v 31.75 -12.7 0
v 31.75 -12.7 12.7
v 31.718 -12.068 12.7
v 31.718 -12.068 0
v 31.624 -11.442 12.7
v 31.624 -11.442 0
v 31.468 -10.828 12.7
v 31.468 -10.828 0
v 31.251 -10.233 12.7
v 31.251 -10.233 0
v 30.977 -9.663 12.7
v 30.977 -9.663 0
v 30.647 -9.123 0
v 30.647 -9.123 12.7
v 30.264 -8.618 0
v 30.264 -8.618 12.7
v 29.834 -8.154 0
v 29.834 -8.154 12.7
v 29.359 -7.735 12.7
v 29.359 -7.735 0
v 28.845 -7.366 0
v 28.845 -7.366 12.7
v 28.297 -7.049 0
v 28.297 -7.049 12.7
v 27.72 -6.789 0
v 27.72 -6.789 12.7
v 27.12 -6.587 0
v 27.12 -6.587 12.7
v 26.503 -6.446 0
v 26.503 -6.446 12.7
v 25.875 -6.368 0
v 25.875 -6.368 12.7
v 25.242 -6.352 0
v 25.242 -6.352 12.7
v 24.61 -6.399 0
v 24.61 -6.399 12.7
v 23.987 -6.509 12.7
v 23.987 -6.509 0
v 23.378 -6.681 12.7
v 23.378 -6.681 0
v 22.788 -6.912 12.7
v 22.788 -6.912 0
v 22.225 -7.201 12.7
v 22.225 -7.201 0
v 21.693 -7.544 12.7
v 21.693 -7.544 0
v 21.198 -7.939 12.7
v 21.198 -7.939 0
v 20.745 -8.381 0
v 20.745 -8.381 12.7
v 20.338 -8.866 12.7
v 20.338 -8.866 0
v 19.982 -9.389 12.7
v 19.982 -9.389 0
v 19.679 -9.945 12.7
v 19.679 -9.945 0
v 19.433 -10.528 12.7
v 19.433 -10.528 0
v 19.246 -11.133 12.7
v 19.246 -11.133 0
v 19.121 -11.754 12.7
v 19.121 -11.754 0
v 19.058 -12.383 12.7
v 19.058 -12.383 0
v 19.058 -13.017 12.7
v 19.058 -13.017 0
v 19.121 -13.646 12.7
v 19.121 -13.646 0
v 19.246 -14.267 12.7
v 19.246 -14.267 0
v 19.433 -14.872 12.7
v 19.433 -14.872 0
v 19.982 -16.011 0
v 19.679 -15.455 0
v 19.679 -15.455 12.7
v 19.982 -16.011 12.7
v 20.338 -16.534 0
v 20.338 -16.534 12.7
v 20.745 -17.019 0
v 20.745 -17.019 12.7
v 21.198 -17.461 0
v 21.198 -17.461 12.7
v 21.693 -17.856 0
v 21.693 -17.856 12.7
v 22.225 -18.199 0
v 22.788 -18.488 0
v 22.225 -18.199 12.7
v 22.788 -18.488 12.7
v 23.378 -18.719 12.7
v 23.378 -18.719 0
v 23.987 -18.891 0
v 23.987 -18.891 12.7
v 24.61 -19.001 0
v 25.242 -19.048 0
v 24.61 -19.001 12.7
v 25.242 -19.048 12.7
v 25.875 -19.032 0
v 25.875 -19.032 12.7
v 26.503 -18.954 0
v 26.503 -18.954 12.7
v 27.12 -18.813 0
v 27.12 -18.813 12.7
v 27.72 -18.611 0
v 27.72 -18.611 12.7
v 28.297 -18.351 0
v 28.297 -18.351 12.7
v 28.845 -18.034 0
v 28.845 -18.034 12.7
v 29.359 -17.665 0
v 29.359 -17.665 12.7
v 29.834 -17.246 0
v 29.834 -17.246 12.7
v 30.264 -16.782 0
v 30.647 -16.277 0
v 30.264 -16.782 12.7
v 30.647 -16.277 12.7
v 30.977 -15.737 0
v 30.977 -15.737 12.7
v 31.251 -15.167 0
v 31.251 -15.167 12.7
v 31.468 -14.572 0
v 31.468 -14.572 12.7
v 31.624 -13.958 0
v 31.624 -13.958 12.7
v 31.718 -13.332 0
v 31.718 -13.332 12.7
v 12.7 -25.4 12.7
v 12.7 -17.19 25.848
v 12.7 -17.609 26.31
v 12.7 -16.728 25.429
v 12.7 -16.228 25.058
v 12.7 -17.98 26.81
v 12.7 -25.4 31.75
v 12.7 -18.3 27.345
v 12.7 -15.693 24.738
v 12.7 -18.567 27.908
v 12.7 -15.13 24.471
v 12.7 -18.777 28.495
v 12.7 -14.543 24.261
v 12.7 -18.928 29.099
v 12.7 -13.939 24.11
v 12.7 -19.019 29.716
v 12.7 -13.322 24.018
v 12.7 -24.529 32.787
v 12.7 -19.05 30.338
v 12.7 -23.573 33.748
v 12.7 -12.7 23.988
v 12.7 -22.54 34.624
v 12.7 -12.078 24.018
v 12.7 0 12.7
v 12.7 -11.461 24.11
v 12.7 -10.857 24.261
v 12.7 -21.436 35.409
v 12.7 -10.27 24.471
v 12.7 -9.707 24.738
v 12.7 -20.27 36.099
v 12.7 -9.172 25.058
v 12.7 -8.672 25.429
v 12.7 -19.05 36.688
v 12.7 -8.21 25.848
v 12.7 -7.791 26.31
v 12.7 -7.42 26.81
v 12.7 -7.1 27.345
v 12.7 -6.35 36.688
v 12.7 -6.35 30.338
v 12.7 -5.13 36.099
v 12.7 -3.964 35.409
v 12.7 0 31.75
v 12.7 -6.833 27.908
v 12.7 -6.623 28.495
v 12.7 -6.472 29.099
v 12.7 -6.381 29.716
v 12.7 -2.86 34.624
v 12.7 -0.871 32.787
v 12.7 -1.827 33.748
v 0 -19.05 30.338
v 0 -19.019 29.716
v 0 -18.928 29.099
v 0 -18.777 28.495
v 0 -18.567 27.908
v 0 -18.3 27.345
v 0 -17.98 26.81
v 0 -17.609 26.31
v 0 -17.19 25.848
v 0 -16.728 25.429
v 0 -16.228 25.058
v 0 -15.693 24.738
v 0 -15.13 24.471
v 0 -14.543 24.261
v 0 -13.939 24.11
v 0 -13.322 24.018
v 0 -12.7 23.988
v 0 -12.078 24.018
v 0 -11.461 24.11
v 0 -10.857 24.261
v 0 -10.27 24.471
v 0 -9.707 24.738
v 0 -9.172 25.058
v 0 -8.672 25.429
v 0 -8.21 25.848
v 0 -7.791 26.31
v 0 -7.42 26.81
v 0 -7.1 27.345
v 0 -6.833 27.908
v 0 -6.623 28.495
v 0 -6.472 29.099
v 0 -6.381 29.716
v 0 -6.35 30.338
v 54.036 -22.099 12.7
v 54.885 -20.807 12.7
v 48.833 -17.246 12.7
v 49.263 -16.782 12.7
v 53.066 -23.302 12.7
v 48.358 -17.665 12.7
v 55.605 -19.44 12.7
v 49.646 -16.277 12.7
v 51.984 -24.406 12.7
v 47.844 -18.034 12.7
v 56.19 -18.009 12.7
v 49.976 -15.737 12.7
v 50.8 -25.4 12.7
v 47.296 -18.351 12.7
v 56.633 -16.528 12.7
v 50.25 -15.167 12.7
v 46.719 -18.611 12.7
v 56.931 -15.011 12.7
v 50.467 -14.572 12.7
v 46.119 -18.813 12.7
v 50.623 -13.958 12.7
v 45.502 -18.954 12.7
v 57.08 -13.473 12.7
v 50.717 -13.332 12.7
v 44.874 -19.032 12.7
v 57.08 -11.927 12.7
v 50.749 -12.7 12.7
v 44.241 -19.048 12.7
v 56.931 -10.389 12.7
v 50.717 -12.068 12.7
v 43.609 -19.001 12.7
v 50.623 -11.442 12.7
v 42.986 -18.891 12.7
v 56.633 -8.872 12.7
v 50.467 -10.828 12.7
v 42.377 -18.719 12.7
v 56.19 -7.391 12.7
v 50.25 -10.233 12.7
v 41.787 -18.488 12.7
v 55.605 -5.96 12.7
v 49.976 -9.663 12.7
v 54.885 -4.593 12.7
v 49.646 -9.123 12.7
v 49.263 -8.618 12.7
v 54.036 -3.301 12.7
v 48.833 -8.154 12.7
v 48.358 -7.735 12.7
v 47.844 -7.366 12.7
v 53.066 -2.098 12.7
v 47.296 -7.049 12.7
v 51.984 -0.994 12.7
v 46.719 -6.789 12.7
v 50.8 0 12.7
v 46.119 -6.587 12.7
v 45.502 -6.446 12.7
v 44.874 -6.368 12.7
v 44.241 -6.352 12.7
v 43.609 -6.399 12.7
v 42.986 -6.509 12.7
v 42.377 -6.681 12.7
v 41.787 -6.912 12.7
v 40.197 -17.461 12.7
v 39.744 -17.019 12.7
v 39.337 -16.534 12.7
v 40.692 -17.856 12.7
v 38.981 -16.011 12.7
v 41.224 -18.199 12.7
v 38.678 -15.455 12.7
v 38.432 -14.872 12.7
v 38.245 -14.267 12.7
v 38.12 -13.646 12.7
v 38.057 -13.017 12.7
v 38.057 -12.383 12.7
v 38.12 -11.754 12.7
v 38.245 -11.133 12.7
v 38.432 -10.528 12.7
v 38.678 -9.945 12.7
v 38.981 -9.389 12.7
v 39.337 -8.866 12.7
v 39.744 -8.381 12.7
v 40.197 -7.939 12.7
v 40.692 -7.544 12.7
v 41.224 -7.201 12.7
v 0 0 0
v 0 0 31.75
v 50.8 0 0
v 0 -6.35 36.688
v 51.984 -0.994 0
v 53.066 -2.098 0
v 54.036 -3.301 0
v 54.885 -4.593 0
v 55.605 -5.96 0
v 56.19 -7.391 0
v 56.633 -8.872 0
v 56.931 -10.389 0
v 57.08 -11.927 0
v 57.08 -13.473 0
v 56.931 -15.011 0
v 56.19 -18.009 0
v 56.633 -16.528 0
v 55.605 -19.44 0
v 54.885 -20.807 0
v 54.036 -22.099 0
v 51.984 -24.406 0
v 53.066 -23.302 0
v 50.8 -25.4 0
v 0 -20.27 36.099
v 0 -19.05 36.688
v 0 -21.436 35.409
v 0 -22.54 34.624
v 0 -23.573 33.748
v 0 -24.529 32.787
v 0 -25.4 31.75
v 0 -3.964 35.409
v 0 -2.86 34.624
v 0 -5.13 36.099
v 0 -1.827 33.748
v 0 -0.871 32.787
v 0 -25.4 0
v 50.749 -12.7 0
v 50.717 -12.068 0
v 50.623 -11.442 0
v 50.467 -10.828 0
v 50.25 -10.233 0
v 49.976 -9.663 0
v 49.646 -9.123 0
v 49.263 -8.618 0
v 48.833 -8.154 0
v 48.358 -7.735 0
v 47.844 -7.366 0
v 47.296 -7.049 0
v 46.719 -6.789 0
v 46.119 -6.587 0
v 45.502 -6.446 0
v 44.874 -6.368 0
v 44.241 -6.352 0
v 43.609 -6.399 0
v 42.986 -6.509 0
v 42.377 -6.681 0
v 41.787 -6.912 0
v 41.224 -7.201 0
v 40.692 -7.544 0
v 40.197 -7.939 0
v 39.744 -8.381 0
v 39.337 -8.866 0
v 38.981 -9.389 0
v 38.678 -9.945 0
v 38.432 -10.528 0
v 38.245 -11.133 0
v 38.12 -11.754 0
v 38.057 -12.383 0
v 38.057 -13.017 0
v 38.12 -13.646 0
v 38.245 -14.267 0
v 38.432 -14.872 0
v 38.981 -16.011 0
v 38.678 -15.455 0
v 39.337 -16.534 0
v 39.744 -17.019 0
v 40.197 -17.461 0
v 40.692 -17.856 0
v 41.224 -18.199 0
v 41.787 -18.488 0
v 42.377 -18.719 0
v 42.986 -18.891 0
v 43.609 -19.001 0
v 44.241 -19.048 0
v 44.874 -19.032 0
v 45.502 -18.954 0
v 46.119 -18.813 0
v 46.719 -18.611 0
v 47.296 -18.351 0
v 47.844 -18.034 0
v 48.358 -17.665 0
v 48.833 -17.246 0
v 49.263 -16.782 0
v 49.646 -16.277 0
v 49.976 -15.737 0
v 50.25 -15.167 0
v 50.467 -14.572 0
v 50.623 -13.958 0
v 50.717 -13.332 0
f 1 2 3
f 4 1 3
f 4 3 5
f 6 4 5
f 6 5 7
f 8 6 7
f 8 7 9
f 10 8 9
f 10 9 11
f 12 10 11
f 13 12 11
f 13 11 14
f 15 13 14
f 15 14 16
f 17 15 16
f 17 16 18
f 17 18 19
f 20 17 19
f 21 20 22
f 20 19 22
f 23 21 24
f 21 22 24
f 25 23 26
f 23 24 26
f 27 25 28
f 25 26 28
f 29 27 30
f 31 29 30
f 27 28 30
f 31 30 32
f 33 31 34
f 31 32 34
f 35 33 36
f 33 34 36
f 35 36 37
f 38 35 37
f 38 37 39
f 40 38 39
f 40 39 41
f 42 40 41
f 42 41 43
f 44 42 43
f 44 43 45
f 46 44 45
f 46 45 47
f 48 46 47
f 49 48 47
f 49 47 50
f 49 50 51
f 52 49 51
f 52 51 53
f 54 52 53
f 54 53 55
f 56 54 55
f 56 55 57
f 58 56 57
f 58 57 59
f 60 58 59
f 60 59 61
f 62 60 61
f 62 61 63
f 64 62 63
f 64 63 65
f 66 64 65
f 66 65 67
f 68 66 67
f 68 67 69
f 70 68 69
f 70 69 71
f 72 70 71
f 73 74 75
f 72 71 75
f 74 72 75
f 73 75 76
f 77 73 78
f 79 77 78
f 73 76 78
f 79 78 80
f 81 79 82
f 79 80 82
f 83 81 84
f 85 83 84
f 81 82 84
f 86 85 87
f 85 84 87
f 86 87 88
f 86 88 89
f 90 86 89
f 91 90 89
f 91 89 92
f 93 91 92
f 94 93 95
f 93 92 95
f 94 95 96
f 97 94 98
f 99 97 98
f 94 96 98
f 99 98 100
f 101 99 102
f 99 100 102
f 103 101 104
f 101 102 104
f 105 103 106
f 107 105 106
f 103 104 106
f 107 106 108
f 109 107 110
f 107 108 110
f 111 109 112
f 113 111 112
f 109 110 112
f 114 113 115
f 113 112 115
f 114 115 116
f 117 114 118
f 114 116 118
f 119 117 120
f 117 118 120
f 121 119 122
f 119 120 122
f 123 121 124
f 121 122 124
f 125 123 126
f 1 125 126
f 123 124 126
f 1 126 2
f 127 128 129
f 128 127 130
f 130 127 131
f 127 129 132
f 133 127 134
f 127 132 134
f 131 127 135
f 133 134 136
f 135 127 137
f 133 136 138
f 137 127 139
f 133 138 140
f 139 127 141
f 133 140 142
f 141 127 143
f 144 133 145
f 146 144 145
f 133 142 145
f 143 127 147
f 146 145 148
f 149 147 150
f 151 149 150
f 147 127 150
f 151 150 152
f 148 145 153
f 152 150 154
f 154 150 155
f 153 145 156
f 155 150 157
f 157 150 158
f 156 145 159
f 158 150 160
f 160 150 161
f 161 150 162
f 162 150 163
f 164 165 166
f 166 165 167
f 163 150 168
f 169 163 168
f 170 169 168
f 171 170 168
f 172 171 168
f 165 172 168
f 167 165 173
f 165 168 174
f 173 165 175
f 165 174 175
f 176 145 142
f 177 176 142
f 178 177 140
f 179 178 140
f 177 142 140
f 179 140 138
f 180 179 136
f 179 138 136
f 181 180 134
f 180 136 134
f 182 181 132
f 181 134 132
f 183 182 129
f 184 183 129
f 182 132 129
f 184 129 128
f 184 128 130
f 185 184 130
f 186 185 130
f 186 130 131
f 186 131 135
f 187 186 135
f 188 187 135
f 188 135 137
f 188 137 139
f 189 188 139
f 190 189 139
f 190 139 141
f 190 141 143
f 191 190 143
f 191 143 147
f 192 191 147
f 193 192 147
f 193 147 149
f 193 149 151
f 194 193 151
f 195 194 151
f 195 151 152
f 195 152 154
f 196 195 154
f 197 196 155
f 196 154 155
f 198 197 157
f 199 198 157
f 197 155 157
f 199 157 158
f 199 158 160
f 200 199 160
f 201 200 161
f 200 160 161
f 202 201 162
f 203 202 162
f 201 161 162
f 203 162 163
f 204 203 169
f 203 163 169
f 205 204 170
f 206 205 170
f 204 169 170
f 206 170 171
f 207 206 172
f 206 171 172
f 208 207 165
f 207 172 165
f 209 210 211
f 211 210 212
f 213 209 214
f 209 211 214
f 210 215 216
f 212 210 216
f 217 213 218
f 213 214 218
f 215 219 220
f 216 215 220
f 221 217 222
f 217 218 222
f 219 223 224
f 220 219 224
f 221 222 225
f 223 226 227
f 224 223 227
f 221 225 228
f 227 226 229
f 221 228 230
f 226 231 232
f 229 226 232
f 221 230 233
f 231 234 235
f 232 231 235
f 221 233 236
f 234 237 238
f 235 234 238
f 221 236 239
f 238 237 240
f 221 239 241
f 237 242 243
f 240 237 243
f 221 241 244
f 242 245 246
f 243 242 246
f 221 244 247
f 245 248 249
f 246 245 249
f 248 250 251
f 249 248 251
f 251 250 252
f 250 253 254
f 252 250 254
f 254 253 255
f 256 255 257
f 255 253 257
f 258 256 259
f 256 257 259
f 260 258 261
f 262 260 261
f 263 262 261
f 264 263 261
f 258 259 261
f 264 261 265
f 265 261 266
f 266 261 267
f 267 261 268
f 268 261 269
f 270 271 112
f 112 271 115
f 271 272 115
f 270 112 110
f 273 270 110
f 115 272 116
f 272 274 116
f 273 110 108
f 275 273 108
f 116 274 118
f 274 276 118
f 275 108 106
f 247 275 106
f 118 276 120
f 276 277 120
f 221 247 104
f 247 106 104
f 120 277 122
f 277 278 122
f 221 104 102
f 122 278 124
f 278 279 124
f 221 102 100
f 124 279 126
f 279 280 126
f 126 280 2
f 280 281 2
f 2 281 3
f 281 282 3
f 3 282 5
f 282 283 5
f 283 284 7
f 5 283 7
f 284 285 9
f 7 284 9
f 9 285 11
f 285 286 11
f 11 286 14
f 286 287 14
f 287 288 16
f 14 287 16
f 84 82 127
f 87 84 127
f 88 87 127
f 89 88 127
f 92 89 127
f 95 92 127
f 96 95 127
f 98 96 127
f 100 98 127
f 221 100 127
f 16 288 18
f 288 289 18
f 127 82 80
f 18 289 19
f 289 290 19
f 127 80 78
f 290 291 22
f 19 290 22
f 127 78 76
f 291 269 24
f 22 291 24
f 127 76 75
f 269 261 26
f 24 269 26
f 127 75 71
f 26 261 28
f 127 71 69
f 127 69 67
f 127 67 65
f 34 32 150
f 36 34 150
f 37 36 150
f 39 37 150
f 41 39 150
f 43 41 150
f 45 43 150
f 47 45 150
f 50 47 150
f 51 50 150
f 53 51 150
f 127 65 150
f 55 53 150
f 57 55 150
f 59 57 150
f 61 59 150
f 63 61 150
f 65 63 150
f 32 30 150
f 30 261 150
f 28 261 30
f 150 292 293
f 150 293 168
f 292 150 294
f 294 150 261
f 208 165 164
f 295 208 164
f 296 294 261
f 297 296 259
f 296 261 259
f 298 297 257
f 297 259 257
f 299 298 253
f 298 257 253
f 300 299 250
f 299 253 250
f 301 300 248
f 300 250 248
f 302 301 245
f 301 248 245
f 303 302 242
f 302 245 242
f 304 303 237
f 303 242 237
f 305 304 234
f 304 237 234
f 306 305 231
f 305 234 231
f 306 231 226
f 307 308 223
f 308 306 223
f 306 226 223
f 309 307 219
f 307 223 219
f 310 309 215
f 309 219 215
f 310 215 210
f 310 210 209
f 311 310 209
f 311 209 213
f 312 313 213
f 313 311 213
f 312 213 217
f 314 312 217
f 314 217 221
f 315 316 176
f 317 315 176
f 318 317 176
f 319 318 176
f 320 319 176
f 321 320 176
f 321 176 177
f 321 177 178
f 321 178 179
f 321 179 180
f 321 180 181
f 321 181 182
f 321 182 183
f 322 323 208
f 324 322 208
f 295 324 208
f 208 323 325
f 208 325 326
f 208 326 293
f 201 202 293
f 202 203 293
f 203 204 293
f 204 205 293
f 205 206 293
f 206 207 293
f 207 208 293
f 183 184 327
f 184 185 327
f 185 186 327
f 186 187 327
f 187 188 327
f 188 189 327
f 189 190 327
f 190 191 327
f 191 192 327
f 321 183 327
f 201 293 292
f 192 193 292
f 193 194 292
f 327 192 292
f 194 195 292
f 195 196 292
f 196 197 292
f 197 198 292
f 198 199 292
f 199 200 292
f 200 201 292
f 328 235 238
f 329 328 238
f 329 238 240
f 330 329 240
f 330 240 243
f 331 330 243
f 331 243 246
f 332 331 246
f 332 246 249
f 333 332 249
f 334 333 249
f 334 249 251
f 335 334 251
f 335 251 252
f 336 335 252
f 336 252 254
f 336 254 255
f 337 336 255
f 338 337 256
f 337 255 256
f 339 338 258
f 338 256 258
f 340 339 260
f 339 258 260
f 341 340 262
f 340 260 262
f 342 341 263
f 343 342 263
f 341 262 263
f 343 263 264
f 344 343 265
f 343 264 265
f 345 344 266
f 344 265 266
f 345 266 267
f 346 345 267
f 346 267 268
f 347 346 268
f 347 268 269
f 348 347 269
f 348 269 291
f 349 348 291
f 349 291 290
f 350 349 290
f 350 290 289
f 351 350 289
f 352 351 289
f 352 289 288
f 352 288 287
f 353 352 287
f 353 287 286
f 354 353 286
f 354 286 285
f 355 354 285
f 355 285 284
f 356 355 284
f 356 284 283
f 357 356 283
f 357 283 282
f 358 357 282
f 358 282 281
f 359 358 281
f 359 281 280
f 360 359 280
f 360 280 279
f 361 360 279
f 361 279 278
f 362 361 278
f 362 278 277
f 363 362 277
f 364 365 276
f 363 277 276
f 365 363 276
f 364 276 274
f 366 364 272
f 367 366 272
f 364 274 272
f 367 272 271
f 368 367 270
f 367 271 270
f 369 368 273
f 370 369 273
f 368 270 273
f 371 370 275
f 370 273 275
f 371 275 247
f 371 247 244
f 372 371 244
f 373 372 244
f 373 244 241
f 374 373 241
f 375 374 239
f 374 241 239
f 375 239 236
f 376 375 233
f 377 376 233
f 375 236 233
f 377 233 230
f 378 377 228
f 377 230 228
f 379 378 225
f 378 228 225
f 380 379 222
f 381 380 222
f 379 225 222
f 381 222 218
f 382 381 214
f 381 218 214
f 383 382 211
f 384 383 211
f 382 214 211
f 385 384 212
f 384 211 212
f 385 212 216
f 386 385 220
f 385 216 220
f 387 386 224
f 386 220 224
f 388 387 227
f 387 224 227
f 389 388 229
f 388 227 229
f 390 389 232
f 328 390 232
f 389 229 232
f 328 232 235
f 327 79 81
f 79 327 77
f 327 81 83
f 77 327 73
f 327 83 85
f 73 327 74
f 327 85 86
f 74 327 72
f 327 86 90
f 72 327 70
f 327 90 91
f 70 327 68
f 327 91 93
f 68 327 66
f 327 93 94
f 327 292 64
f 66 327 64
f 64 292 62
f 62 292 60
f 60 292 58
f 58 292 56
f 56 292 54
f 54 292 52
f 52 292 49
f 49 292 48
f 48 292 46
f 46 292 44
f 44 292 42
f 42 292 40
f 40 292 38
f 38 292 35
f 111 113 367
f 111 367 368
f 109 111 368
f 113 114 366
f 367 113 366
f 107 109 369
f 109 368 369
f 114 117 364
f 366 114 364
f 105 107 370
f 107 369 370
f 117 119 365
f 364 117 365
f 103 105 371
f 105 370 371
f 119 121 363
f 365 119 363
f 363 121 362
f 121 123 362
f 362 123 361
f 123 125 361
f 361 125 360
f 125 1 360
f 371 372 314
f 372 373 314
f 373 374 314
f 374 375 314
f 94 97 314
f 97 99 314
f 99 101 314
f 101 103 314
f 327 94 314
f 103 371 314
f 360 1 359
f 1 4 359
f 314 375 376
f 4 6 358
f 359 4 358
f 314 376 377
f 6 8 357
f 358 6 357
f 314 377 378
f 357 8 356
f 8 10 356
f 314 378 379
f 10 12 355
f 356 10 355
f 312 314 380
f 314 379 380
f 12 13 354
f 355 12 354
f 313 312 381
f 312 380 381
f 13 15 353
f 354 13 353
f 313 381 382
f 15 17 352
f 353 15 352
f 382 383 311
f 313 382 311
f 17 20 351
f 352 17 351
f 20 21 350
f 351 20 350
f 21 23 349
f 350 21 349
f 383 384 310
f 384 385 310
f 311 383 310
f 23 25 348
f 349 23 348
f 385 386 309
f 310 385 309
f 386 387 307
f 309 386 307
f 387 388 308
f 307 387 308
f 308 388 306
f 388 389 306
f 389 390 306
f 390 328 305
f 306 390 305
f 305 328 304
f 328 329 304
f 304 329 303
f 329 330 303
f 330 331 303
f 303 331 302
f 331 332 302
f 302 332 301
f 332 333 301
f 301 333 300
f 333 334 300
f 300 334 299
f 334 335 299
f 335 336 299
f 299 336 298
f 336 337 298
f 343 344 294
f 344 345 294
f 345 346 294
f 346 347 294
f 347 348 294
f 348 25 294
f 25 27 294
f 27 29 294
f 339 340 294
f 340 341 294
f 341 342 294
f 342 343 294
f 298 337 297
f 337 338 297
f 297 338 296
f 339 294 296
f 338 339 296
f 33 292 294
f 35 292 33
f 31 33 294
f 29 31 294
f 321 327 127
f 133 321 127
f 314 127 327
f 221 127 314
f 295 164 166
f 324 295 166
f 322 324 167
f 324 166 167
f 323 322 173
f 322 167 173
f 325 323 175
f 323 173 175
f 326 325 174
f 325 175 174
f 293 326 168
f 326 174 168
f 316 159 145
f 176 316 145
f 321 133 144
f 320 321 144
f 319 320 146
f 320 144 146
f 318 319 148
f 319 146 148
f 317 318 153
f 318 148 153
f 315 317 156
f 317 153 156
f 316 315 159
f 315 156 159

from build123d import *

# Parameters (mm, degrees)
F1_DEPTH = 25.4
F3_DEPTH = 25.4
F5_DEPTH = 25.4
F7_DEPTH = 25.4
F8_R     = 6.35
F9_DEPTH = 25.4


with BuildPart() as f1:
    # F0 (on Front) → F1 (new body)
    with BuildSketch(Plane.XZ):
        Polygon((0, 38.1), (0, 0), (57.15, 0), (57.15, 12.7), (12.7, 12.7), (12.7, 38.1), align=None)
    extrude(amount=F1_DEPTH)

    # F2 (on face) → F3 (cut)
    with BuildSketch(Plane.YZ.offset(12.7)):
        with BuildLine():
            Line((-25.4, 38.1), (-25.4, 31.75))
            ThreePointArc((-25.4, 31.75), (-12.7, 37.999339), (0, 31.75))
            Line((0, 31.75), (0, 38.1))
            Line((0, 38.1), (-25.4, 38.1))
        make_face()
    extrude(amount=-F3_DEPTH, mode=Mode.SUBTRACT)

    # F4 (on face) → F5 (cut)
    with BuildSketch(Plane.YZ.offset(12.7)):
        with BuildLine():
            ThreePointArc((-6.35, 36.687912), (-12.7, 37.999339), (-19.05, 36.687912))
            Line((-19.05, 36.687912), (-19.05, 30.337912))
            ThreePointArc((-19.05, 30.337912), (-12.7, 23.987912), (-6.35, 30.337912))
            Line((-6.35, 30.337912), (-6.35, 36.687912))
        make_face()
    extrude(amount=-F5_DEPTH, mode=Mode.SUBTRACT)

    # F6 (on face) → F7 (cut)
    with BuildSketch(Plane.XY.offset(12.7)):
        with BuildLine():
            Line((57.15, 0), (50.8, 0))
            ThreePointArc((50.8, 0), (57.099, -12.7), (50.8, -25.4))
            Line((50.8, -25.4), (57.15, -25.4))
            Line((57.15, -25.4), (57.15, 0))
        make_face()
    extrude(amount=-F7_DEPTH, mode=Mode.SUBTRACT)

    # F8 (on face) → F9 (cut)
    with BuildSketch(Plane.XY.offset(12.7)):
        with Locations((25.4, -12.7)):
            Circle(F8_R)
        with Locations((44.399, -12.7)):
            Circle(F8_R)
    extrude(amount=-F9_DEPTH, mode=Mode.SUBTRACT)


solid = f1.part
